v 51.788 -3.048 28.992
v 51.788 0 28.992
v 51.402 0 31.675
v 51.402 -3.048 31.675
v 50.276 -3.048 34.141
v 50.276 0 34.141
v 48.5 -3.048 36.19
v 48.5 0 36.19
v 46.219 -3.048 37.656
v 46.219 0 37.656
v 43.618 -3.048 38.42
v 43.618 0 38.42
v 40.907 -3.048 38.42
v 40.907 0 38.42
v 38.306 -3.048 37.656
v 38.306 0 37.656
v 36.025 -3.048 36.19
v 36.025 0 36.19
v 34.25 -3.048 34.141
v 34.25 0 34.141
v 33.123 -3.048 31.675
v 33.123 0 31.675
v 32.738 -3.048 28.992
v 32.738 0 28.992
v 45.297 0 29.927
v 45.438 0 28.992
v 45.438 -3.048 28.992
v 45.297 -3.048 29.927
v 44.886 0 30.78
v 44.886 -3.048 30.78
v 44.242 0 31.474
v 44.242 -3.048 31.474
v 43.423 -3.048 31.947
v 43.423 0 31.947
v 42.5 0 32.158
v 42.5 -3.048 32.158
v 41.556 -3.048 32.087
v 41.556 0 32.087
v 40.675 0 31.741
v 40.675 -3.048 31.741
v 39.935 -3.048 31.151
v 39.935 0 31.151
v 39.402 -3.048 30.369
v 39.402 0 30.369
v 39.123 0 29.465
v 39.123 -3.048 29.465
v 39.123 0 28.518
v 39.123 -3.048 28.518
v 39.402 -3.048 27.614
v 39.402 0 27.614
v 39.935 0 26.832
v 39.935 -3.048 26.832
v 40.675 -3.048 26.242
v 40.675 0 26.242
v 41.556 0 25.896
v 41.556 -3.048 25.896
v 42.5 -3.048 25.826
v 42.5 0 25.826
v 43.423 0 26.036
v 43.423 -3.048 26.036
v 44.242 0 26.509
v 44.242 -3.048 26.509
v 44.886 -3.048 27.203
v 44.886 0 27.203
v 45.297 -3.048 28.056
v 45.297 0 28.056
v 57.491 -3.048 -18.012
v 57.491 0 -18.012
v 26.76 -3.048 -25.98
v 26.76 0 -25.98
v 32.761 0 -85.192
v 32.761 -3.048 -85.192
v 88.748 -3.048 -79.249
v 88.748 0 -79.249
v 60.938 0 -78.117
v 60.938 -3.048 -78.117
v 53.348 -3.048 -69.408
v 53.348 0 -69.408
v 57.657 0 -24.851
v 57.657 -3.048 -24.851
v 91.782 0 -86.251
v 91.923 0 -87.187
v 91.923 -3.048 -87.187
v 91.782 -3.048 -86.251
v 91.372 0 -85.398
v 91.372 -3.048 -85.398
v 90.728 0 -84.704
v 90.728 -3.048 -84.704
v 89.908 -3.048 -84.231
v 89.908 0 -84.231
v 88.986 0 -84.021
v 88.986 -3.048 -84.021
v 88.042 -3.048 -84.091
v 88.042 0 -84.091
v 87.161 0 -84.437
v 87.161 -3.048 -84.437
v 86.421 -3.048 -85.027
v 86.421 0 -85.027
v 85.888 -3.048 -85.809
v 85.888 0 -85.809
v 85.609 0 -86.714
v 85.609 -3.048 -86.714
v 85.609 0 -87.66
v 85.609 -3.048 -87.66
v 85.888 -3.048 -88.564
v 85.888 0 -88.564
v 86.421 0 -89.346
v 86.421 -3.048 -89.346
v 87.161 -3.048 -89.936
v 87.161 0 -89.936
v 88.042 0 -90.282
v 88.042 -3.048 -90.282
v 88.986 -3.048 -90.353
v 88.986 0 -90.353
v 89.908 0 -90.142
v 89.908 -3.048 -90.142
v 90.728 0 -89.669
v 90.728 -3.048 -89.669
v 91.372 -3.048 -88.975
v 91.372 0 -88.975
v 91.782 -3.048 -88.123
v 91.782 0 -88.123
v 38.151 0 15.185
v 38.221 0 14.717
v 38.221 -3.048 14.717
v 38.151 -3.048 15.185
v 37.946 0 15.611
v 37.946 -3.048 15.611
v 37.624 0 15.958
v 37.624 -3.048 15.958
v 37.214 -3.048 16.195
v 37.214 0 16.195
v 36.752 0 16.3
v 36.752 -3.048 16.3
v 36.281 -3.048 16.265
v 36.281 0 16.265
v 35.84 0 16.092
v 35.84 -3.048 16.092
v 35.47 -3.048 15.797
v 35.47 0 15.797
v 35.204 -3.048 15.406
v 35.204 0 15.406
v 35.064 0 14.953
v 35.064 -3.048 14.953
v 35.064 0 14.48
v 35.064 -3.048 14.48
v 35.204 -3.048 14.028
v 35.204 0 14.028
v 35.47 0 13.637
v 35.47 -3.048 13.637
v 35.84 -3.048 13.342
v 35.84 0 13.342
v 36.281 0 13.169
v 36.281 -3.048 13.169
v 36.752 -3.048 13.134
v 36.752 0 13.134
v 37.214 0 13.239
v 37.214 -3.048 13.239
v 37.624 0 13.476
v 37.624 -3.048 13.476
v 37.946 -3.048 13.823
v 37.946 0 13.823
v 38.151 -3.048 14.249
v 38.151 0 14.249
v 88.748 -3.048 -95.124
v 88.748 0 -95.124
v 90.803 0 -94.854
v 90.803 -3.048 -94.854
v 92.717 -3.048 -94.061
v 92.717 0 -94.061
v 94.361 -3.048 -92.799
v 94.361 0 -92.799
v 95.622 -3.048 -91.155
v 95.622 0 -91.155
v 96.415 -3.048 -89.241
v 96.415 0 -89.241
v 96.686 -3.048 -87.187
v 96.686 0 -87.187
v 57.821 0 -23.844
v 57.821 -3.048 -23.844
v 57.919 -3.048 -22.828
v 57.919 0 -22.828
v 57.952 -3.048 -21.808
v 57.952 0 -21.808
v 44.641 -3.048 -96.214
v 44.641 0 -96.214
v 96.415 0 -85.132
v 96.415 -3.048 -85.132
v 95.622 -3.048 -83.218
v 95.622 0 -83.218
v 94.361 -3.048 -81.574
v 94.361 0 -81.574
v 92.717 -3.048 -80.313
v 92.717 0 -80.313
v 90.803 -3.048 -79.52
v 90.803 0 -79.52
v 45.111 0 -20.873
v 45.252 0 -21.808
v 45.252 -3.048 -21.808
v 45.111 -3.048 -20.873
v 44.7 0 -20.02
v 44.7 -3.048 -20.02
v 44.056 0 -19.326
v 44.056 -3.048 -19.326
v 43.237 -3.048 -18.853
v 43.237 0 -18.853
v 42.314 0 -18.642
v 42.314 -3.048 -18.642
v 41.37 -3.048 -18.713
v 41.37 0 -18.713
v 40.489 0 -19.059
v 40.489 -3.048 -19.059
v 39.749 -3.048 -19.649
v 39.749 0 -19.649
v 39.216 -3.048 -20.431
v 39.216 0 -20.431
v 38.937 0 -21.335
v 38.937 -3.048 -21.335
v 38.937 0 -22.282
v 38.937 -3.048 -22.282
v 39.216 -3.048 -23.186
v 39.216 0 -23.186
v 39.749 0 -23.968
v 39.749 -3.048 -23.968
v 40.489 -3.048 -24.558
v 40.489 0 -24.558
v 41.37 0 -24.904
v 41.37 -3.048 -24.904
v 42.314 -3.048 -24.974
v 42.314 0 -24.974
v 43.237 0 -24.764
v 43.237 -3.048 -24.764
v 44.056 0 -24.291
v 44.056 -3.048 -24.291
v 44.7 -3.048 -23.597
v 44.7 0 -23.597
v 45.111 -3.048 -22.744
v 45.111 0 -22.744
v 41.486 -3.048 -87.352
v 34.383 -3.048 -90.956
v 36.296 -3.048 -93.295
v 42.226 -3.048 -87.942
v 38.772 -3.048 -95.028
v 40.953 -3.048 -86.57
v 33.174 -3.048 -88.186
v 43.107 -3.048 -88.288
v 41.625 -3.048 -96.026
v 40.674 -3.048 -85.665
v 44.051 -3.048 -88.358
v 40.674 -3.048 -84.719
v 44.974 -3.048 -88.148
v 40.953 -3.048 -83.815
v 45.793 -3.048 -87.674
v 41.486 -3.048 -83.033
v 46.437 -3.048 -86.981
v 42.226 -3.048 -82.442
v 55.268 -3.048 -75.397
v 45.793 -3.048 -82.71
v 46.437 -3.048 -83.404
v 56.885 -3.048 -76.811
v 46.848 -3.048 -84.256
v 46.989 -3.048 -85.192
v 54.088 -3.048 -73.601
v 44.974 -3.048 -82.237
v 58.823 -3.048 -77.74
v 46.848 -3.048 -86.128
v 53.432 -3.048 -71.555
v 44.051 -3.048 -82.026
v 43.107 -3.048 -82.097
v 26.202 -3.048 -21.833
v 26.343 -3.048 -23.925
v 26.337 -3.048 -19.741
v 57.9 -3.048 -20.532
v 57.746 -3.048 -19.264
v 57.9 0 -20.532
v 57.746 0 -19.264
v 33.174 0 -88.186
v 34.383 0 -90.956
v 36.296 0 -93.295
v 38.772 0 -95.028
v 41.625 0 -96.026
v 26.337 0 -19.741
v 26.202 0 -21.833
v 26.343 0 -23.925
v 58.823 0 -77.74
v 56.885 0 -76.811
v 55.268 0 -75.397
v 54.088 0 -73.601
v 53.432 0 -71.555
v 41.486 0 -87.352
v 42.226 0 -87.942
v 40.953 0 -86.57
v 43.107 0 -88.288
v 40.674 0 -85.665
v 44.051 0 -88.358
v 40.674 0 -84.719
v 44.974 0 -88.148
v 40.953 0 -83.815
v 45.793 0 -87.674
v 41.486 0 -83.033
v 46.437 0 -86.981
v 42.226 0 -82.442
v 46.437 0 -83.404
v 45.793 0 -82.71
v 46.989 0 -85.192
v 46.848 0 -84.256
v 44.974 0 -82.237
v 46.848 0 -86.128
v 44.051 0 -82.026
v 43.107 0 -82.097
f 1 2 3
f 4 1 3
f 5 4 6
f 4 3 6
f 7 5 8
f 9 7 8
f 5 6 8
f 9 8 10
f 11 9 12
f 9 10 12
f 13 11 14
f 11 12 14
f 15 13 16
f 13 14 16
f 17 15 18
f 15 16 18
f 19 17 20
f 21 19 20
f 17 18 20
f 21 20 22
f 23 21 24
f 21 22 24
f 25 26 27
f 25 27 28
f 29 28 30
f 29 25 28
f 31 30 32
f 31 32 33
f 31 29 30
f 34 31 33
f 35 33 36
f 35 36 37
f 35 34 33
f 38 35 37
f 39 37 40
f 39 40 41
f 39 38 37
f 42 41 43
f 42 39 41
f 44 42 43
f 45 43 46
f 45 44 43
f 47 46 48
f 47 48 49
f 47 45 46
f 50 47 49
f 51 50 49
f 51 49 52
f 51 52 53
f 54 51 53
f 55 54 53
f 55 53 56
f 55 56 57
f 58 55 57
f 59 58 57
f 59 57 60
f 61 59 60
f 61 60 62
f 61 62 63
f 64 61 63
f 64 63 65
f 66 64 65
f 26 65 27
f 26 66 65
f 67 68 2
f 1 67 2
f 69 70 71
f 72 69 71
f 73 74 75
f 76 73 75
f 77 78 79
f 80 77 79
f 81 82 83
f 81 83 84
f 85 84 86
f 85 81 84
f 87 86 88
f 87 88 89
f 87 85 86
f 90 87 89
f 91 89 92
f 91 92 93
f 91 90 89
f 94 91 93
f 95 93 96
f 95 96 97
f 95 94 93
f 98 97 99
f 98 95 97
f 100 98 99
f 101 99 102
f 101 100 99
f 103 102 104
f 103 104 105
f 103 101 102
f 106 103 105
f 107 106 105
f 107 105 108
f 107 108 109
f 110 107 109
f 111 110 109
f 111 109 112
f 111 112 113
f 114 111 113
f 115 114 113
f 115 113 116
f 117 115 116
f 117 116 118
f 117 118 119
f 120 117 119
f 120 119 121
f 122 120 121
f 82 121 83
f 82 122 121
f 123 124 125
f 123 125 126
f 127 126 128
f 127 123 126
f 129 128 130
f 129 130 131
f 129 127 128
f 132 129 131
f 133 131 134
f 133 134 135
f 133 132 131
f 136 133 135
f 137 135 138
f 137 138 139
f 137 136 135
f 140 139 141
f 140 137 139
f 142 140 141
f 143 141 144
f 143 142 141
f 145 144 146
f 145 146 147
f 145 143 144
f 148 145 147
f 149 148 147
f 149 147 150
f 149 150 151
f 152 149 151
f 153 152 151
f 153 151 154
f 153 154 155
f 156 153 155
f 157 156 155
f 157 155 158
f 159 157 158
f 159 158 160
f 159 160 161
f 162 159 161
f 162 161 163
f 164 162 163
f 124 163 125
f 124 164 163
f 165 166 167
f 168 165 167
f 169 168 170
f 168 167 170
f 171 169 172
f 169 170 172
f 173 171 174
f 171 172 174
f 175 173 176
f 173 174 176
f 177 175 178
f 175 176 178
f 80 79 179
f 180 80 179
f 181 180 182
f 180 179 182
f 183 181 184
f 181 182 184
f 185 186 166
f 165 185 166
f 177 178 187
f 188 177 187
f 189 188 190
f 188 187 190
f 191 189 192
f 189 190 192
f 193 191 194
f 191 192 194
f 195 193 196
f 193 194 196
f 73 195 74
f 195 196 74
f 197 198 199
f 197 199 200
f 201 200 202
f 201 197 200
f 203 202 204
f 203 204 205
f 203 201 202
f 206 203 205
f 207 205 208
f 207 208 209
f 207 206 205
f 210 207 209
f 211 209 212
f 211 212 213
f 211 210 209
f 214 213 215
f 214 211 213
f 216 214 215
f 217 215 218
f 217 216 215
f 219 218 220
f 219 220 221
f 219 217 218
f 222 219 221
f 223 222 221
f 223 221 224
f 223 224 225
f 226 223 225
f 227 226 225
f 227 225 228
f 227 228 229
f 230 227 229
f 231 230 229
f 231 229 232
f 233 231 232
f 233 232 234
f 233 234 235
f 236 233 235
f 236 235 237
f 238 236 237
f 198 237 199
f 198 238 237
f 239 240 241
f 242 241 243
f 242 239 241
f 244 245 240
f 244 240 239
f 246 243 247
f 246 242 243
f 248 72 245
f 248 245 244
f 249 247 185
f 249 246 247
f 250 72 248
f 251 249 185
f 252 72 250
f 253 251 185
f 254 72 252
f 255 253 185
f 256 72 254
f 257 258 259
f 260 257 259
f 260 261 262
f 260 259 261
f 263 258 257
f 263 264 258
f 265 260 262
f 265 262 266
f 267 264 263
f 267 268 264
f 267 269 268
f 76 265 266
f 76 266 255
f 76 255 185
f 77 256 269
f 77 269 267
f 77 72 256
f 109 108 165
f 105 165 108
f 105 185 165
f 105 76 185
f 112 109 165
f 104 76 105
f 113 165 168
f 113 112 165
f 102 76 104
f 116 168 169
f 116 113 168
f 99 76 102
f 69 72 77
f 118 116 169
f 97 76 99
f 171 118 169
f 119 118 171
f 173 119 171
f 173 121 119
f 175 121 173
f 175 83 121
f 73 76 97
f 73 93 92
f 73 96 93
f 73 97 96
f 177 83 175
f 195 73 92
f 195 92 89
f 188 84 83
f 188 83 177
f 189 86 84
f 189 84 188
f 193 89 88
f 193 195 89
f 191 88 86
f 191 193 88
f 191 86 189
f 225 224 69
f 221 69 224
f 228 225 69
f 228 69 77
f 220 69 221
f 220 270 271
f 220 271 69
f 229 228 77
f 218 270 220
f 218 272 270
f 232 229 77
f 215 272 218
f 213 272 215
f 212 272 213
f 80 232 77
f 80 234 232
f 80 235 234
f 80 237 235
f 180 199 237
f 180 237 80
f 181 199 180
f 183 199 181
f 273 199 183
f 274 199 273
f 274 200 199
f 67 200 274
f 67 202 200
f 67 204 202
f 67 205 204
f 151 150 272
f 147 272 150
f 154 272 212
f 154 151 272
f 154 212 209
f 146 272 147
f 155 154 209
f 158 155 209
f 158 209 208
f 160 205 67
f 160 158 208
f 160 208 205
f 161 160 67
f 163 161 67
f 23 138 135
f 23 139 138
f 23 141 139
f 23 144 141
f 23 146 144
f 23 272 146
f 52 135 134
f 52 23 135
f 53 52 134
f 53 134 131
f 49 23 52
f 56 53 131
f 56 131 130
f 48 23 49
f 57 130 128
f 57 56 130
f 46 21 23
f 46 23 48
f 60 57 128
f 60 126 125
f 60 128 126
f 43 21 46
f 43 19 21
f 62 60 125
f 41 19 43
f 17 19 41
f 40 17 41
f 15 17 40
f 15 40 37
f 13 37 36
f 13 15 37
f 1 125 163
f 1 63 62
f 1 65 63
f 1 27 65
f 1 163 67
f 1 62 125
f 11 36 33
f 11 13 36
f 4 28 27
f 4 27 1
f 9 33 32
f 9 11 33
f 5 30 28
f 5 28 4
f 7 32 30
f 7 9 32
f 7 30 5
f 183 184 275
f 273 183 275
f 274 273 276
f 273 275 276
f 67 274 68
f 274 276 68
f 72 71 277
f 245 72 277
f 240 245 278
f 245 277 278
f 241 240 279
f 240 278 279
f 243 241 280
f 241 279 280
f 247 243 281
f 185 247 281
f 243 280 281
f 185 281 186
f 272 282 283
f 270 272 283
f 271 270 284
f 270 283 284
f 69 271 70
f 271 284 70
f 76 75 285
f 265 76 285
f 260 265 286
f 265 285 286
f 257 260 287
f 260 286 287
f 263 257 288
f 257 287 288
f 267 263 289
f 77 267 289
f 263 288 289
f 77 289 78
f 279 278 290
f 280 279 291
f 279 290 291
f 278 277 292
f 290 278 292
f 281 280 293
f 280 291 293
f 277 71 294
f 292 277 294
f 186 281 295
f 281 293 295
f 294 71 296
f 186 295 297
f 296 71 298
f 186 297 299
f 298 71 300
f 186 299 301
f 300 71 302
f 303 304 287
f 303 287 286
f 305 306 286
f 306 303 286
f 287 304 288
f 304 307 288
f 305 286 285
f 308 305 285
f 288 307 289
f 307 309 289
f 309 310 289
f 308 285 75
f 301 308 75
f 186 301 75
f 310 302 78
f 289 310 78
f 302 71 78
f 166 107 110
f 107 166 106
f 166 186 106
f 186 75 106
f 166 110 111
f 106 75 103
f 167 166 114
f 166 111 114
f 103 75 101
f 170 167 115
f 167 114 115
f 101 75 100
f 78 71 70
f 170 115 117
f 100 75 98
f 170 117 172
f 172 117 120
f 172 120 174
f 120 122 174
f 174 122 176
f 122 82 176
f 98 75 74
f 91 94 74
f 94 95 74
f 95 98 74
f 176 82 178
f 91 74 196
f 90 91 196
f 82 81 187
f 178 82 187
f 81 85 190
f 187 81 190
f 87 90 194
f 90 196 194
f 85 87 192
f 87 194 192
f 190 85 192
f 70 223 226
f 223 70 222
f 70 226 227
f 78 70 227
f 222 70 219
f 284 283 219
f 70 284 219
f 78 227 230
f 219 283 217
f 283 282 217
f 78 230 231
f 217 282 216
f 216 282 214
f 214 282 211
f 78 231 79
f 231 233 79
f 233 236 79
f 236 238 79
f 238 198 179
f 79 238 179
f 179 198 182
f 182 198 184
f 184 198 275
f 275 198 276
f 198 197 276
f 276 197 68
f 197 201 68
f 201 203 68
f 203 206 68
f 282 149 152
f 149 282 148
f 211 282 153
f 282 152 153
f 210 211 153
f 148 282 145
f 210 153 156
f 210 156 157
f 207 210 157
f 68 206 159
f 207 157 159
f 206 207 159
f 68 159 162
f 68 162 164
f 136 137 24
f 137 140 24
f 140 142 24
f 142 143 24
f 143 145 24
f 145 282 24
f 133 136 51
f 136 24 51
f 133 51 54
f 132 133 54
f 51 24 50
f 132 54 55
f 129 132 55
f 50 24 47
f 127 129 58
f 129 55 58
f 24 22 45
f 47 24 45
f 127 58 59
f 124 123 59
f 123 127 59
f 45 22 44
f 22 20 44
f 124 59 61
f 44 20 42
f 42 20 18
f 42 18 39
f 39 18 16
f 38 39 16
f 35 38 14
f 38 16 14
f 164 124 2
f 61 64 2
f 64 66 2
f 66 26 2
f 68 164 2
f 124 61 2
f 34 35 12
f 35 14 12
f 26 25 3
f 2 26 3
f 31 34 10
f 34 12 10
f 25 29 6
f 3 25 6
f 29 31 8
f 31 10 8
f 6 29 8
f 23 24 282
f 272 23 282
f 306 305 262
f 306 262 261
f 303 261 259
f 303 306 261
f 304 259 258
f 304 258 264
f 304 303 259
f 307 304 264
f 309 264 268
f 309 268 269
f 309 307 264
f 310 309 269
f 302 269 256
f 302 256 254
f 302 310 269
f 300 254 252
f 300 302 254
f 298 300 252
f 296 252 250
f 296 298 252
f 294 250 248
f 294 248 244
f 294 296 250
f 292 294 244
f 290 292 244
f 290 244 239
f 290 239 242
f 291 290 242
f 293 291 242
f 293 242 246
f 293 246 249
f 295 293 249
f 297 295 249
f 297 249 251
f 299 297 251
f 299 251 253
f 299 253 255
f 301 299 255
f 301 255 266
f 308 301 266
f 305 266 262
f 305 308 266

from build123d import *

# Parameters (mm, degrees)
F0_R     = 3.175
F0_R_2   = 1.5875
F1_DEPTH = 3.048


with BuildPart() as f1:
    # F0 (on Front) → F1 (new body)
    with BuildSketch(Plane.XZ):
        with BuildLine():
            ThreePointArc((32.737635, 28.991633), (42.262635, 19.466633), (51.787635, 28.991633))
            ThreePointArc((51.787635, 28.991633), (42.262635, 38.516633), (32.737635, 28.991633))
        make_face()
        with Locations((42.262635, 28.991633)):
            Circle(F0_R, mode=Mode.SUBTRACT)
        with BuildLine():
            Line((57.491022, -18.011721), (51.787635, 28.991633))
            ThreePointArc((51.787635, 28.991633), (42.262635, 19.466633), (32.737635, 28.991633))
            Line((32.737635, 28.991633), (26.336892, -19.741037))
            ThreePointArc((26.336892, -19.741037), (41.196865, -5.957767), (57.491022, -18.011721))
        make_face()
        with Locations((36.633853, 14.716833)):
            Circle(F0_R_2, mode=Mode.SUBTRACT)
        with BuildLine():
            Line((57.951707, -21.808367), (57.491022, -18.011721))
            ThreePointArc((57.491022, -18.011721), (41.196865, -5.957767), (26.336892, -19.741037))
            ThreePointArc((26.336892, -19.741037), (26.238036, -22.881748), (26.759731, -25.980404))
            ThreePointArc((26.759731, -25.980404), (42.656766, -37.672766), (57.657464, -24.850672))
            Line((57.657464, -24.850672), (57.951707, -21.808367))
        make_face()
        with Locations((42.076707, -21.808367)):
            Circle(F0_R, mode=Mode.SUBTRACT)
        with BuildLine():
            ThreePointArc((57.951707, -21.808367), (57.836115, -19.89612), (57.491022, -18.011721))
            Line((57.491022, -18.011721), (57.951707, -21.808367))
        make_face()
        with BuildLine():
            ThreePointArc((57.657464, -24.850672), (57.877975, -23.336617), (57.951707, -21.808367))
            Line((57.951707, -21.808367), (57.657464, -24.850672))
        make_face()
        with BuildLine():
            ThreePointArc((57.657464, -24.850672), (42.656766, -37.672766), (26.759731, -25.980404))
            Line((26.759731, -25.980404), (32.760889, -85.192107))
            ThreePointArc((32.760889, -85.192107), (43.81357, -74.139426), (54.866251, -85.192107))
            ThreePointArc((54.866251, -85.192107), (51.916301, -92.709253), (44.64113, -96.213762))
            Line((44.64113, -96.213762), (88.748364, -95.124242))
            ThreePointArc((88.748364, -95.124242), (80.810864, -87.186742), (88.748364, -79.249242))
            Line((88.748364, -79.249242), (60.937904, -78.11713))
            ThreePointArc((60.937904, -78.11713), (55.267768, -75.396876), (53.347999, -69.408161))
            Line((53.347999, -69.408161), (57.657464, -24.850672))
        make_face()
        with BuildLine():
            ThreePointArc((54.866251, -85.192107), (43.81357, -74.139426), (32.760889, -85.192107))
            ThreePointArc((32.760889, -85.192107), (36.296423, -93.294838), (44.64113, -96.213762))
            ThreePointArc((44.64113, -96.213762), (51.916301, -92.709253), (54.866251, -85.192107))
        make_face()
        with Locations((43.81357, -85.192107)):
            Circle(F0_R, mode=Mode.SUBTRACT)
        with BuildLine():
            ThreePointArc((88.748364, -79.249242), (80.810864, -87.186742), (88.748364, -95.124242))
            ThreePointArc((88.748364, -95.124242), (94.361024, -92.799402), (96.685864, -87.186742))
            ThreePointArc((96.685864, -87.186742), (94.361024, -81.574082), (88.748364, -79.249242))
        make_face()
        with Locations((88.748364, -87.186742)):
            Circle(F0_R, mode=Mode.SUBTRACT)
    extrude(amount=F1_DEPTH)


solid = f1.part
